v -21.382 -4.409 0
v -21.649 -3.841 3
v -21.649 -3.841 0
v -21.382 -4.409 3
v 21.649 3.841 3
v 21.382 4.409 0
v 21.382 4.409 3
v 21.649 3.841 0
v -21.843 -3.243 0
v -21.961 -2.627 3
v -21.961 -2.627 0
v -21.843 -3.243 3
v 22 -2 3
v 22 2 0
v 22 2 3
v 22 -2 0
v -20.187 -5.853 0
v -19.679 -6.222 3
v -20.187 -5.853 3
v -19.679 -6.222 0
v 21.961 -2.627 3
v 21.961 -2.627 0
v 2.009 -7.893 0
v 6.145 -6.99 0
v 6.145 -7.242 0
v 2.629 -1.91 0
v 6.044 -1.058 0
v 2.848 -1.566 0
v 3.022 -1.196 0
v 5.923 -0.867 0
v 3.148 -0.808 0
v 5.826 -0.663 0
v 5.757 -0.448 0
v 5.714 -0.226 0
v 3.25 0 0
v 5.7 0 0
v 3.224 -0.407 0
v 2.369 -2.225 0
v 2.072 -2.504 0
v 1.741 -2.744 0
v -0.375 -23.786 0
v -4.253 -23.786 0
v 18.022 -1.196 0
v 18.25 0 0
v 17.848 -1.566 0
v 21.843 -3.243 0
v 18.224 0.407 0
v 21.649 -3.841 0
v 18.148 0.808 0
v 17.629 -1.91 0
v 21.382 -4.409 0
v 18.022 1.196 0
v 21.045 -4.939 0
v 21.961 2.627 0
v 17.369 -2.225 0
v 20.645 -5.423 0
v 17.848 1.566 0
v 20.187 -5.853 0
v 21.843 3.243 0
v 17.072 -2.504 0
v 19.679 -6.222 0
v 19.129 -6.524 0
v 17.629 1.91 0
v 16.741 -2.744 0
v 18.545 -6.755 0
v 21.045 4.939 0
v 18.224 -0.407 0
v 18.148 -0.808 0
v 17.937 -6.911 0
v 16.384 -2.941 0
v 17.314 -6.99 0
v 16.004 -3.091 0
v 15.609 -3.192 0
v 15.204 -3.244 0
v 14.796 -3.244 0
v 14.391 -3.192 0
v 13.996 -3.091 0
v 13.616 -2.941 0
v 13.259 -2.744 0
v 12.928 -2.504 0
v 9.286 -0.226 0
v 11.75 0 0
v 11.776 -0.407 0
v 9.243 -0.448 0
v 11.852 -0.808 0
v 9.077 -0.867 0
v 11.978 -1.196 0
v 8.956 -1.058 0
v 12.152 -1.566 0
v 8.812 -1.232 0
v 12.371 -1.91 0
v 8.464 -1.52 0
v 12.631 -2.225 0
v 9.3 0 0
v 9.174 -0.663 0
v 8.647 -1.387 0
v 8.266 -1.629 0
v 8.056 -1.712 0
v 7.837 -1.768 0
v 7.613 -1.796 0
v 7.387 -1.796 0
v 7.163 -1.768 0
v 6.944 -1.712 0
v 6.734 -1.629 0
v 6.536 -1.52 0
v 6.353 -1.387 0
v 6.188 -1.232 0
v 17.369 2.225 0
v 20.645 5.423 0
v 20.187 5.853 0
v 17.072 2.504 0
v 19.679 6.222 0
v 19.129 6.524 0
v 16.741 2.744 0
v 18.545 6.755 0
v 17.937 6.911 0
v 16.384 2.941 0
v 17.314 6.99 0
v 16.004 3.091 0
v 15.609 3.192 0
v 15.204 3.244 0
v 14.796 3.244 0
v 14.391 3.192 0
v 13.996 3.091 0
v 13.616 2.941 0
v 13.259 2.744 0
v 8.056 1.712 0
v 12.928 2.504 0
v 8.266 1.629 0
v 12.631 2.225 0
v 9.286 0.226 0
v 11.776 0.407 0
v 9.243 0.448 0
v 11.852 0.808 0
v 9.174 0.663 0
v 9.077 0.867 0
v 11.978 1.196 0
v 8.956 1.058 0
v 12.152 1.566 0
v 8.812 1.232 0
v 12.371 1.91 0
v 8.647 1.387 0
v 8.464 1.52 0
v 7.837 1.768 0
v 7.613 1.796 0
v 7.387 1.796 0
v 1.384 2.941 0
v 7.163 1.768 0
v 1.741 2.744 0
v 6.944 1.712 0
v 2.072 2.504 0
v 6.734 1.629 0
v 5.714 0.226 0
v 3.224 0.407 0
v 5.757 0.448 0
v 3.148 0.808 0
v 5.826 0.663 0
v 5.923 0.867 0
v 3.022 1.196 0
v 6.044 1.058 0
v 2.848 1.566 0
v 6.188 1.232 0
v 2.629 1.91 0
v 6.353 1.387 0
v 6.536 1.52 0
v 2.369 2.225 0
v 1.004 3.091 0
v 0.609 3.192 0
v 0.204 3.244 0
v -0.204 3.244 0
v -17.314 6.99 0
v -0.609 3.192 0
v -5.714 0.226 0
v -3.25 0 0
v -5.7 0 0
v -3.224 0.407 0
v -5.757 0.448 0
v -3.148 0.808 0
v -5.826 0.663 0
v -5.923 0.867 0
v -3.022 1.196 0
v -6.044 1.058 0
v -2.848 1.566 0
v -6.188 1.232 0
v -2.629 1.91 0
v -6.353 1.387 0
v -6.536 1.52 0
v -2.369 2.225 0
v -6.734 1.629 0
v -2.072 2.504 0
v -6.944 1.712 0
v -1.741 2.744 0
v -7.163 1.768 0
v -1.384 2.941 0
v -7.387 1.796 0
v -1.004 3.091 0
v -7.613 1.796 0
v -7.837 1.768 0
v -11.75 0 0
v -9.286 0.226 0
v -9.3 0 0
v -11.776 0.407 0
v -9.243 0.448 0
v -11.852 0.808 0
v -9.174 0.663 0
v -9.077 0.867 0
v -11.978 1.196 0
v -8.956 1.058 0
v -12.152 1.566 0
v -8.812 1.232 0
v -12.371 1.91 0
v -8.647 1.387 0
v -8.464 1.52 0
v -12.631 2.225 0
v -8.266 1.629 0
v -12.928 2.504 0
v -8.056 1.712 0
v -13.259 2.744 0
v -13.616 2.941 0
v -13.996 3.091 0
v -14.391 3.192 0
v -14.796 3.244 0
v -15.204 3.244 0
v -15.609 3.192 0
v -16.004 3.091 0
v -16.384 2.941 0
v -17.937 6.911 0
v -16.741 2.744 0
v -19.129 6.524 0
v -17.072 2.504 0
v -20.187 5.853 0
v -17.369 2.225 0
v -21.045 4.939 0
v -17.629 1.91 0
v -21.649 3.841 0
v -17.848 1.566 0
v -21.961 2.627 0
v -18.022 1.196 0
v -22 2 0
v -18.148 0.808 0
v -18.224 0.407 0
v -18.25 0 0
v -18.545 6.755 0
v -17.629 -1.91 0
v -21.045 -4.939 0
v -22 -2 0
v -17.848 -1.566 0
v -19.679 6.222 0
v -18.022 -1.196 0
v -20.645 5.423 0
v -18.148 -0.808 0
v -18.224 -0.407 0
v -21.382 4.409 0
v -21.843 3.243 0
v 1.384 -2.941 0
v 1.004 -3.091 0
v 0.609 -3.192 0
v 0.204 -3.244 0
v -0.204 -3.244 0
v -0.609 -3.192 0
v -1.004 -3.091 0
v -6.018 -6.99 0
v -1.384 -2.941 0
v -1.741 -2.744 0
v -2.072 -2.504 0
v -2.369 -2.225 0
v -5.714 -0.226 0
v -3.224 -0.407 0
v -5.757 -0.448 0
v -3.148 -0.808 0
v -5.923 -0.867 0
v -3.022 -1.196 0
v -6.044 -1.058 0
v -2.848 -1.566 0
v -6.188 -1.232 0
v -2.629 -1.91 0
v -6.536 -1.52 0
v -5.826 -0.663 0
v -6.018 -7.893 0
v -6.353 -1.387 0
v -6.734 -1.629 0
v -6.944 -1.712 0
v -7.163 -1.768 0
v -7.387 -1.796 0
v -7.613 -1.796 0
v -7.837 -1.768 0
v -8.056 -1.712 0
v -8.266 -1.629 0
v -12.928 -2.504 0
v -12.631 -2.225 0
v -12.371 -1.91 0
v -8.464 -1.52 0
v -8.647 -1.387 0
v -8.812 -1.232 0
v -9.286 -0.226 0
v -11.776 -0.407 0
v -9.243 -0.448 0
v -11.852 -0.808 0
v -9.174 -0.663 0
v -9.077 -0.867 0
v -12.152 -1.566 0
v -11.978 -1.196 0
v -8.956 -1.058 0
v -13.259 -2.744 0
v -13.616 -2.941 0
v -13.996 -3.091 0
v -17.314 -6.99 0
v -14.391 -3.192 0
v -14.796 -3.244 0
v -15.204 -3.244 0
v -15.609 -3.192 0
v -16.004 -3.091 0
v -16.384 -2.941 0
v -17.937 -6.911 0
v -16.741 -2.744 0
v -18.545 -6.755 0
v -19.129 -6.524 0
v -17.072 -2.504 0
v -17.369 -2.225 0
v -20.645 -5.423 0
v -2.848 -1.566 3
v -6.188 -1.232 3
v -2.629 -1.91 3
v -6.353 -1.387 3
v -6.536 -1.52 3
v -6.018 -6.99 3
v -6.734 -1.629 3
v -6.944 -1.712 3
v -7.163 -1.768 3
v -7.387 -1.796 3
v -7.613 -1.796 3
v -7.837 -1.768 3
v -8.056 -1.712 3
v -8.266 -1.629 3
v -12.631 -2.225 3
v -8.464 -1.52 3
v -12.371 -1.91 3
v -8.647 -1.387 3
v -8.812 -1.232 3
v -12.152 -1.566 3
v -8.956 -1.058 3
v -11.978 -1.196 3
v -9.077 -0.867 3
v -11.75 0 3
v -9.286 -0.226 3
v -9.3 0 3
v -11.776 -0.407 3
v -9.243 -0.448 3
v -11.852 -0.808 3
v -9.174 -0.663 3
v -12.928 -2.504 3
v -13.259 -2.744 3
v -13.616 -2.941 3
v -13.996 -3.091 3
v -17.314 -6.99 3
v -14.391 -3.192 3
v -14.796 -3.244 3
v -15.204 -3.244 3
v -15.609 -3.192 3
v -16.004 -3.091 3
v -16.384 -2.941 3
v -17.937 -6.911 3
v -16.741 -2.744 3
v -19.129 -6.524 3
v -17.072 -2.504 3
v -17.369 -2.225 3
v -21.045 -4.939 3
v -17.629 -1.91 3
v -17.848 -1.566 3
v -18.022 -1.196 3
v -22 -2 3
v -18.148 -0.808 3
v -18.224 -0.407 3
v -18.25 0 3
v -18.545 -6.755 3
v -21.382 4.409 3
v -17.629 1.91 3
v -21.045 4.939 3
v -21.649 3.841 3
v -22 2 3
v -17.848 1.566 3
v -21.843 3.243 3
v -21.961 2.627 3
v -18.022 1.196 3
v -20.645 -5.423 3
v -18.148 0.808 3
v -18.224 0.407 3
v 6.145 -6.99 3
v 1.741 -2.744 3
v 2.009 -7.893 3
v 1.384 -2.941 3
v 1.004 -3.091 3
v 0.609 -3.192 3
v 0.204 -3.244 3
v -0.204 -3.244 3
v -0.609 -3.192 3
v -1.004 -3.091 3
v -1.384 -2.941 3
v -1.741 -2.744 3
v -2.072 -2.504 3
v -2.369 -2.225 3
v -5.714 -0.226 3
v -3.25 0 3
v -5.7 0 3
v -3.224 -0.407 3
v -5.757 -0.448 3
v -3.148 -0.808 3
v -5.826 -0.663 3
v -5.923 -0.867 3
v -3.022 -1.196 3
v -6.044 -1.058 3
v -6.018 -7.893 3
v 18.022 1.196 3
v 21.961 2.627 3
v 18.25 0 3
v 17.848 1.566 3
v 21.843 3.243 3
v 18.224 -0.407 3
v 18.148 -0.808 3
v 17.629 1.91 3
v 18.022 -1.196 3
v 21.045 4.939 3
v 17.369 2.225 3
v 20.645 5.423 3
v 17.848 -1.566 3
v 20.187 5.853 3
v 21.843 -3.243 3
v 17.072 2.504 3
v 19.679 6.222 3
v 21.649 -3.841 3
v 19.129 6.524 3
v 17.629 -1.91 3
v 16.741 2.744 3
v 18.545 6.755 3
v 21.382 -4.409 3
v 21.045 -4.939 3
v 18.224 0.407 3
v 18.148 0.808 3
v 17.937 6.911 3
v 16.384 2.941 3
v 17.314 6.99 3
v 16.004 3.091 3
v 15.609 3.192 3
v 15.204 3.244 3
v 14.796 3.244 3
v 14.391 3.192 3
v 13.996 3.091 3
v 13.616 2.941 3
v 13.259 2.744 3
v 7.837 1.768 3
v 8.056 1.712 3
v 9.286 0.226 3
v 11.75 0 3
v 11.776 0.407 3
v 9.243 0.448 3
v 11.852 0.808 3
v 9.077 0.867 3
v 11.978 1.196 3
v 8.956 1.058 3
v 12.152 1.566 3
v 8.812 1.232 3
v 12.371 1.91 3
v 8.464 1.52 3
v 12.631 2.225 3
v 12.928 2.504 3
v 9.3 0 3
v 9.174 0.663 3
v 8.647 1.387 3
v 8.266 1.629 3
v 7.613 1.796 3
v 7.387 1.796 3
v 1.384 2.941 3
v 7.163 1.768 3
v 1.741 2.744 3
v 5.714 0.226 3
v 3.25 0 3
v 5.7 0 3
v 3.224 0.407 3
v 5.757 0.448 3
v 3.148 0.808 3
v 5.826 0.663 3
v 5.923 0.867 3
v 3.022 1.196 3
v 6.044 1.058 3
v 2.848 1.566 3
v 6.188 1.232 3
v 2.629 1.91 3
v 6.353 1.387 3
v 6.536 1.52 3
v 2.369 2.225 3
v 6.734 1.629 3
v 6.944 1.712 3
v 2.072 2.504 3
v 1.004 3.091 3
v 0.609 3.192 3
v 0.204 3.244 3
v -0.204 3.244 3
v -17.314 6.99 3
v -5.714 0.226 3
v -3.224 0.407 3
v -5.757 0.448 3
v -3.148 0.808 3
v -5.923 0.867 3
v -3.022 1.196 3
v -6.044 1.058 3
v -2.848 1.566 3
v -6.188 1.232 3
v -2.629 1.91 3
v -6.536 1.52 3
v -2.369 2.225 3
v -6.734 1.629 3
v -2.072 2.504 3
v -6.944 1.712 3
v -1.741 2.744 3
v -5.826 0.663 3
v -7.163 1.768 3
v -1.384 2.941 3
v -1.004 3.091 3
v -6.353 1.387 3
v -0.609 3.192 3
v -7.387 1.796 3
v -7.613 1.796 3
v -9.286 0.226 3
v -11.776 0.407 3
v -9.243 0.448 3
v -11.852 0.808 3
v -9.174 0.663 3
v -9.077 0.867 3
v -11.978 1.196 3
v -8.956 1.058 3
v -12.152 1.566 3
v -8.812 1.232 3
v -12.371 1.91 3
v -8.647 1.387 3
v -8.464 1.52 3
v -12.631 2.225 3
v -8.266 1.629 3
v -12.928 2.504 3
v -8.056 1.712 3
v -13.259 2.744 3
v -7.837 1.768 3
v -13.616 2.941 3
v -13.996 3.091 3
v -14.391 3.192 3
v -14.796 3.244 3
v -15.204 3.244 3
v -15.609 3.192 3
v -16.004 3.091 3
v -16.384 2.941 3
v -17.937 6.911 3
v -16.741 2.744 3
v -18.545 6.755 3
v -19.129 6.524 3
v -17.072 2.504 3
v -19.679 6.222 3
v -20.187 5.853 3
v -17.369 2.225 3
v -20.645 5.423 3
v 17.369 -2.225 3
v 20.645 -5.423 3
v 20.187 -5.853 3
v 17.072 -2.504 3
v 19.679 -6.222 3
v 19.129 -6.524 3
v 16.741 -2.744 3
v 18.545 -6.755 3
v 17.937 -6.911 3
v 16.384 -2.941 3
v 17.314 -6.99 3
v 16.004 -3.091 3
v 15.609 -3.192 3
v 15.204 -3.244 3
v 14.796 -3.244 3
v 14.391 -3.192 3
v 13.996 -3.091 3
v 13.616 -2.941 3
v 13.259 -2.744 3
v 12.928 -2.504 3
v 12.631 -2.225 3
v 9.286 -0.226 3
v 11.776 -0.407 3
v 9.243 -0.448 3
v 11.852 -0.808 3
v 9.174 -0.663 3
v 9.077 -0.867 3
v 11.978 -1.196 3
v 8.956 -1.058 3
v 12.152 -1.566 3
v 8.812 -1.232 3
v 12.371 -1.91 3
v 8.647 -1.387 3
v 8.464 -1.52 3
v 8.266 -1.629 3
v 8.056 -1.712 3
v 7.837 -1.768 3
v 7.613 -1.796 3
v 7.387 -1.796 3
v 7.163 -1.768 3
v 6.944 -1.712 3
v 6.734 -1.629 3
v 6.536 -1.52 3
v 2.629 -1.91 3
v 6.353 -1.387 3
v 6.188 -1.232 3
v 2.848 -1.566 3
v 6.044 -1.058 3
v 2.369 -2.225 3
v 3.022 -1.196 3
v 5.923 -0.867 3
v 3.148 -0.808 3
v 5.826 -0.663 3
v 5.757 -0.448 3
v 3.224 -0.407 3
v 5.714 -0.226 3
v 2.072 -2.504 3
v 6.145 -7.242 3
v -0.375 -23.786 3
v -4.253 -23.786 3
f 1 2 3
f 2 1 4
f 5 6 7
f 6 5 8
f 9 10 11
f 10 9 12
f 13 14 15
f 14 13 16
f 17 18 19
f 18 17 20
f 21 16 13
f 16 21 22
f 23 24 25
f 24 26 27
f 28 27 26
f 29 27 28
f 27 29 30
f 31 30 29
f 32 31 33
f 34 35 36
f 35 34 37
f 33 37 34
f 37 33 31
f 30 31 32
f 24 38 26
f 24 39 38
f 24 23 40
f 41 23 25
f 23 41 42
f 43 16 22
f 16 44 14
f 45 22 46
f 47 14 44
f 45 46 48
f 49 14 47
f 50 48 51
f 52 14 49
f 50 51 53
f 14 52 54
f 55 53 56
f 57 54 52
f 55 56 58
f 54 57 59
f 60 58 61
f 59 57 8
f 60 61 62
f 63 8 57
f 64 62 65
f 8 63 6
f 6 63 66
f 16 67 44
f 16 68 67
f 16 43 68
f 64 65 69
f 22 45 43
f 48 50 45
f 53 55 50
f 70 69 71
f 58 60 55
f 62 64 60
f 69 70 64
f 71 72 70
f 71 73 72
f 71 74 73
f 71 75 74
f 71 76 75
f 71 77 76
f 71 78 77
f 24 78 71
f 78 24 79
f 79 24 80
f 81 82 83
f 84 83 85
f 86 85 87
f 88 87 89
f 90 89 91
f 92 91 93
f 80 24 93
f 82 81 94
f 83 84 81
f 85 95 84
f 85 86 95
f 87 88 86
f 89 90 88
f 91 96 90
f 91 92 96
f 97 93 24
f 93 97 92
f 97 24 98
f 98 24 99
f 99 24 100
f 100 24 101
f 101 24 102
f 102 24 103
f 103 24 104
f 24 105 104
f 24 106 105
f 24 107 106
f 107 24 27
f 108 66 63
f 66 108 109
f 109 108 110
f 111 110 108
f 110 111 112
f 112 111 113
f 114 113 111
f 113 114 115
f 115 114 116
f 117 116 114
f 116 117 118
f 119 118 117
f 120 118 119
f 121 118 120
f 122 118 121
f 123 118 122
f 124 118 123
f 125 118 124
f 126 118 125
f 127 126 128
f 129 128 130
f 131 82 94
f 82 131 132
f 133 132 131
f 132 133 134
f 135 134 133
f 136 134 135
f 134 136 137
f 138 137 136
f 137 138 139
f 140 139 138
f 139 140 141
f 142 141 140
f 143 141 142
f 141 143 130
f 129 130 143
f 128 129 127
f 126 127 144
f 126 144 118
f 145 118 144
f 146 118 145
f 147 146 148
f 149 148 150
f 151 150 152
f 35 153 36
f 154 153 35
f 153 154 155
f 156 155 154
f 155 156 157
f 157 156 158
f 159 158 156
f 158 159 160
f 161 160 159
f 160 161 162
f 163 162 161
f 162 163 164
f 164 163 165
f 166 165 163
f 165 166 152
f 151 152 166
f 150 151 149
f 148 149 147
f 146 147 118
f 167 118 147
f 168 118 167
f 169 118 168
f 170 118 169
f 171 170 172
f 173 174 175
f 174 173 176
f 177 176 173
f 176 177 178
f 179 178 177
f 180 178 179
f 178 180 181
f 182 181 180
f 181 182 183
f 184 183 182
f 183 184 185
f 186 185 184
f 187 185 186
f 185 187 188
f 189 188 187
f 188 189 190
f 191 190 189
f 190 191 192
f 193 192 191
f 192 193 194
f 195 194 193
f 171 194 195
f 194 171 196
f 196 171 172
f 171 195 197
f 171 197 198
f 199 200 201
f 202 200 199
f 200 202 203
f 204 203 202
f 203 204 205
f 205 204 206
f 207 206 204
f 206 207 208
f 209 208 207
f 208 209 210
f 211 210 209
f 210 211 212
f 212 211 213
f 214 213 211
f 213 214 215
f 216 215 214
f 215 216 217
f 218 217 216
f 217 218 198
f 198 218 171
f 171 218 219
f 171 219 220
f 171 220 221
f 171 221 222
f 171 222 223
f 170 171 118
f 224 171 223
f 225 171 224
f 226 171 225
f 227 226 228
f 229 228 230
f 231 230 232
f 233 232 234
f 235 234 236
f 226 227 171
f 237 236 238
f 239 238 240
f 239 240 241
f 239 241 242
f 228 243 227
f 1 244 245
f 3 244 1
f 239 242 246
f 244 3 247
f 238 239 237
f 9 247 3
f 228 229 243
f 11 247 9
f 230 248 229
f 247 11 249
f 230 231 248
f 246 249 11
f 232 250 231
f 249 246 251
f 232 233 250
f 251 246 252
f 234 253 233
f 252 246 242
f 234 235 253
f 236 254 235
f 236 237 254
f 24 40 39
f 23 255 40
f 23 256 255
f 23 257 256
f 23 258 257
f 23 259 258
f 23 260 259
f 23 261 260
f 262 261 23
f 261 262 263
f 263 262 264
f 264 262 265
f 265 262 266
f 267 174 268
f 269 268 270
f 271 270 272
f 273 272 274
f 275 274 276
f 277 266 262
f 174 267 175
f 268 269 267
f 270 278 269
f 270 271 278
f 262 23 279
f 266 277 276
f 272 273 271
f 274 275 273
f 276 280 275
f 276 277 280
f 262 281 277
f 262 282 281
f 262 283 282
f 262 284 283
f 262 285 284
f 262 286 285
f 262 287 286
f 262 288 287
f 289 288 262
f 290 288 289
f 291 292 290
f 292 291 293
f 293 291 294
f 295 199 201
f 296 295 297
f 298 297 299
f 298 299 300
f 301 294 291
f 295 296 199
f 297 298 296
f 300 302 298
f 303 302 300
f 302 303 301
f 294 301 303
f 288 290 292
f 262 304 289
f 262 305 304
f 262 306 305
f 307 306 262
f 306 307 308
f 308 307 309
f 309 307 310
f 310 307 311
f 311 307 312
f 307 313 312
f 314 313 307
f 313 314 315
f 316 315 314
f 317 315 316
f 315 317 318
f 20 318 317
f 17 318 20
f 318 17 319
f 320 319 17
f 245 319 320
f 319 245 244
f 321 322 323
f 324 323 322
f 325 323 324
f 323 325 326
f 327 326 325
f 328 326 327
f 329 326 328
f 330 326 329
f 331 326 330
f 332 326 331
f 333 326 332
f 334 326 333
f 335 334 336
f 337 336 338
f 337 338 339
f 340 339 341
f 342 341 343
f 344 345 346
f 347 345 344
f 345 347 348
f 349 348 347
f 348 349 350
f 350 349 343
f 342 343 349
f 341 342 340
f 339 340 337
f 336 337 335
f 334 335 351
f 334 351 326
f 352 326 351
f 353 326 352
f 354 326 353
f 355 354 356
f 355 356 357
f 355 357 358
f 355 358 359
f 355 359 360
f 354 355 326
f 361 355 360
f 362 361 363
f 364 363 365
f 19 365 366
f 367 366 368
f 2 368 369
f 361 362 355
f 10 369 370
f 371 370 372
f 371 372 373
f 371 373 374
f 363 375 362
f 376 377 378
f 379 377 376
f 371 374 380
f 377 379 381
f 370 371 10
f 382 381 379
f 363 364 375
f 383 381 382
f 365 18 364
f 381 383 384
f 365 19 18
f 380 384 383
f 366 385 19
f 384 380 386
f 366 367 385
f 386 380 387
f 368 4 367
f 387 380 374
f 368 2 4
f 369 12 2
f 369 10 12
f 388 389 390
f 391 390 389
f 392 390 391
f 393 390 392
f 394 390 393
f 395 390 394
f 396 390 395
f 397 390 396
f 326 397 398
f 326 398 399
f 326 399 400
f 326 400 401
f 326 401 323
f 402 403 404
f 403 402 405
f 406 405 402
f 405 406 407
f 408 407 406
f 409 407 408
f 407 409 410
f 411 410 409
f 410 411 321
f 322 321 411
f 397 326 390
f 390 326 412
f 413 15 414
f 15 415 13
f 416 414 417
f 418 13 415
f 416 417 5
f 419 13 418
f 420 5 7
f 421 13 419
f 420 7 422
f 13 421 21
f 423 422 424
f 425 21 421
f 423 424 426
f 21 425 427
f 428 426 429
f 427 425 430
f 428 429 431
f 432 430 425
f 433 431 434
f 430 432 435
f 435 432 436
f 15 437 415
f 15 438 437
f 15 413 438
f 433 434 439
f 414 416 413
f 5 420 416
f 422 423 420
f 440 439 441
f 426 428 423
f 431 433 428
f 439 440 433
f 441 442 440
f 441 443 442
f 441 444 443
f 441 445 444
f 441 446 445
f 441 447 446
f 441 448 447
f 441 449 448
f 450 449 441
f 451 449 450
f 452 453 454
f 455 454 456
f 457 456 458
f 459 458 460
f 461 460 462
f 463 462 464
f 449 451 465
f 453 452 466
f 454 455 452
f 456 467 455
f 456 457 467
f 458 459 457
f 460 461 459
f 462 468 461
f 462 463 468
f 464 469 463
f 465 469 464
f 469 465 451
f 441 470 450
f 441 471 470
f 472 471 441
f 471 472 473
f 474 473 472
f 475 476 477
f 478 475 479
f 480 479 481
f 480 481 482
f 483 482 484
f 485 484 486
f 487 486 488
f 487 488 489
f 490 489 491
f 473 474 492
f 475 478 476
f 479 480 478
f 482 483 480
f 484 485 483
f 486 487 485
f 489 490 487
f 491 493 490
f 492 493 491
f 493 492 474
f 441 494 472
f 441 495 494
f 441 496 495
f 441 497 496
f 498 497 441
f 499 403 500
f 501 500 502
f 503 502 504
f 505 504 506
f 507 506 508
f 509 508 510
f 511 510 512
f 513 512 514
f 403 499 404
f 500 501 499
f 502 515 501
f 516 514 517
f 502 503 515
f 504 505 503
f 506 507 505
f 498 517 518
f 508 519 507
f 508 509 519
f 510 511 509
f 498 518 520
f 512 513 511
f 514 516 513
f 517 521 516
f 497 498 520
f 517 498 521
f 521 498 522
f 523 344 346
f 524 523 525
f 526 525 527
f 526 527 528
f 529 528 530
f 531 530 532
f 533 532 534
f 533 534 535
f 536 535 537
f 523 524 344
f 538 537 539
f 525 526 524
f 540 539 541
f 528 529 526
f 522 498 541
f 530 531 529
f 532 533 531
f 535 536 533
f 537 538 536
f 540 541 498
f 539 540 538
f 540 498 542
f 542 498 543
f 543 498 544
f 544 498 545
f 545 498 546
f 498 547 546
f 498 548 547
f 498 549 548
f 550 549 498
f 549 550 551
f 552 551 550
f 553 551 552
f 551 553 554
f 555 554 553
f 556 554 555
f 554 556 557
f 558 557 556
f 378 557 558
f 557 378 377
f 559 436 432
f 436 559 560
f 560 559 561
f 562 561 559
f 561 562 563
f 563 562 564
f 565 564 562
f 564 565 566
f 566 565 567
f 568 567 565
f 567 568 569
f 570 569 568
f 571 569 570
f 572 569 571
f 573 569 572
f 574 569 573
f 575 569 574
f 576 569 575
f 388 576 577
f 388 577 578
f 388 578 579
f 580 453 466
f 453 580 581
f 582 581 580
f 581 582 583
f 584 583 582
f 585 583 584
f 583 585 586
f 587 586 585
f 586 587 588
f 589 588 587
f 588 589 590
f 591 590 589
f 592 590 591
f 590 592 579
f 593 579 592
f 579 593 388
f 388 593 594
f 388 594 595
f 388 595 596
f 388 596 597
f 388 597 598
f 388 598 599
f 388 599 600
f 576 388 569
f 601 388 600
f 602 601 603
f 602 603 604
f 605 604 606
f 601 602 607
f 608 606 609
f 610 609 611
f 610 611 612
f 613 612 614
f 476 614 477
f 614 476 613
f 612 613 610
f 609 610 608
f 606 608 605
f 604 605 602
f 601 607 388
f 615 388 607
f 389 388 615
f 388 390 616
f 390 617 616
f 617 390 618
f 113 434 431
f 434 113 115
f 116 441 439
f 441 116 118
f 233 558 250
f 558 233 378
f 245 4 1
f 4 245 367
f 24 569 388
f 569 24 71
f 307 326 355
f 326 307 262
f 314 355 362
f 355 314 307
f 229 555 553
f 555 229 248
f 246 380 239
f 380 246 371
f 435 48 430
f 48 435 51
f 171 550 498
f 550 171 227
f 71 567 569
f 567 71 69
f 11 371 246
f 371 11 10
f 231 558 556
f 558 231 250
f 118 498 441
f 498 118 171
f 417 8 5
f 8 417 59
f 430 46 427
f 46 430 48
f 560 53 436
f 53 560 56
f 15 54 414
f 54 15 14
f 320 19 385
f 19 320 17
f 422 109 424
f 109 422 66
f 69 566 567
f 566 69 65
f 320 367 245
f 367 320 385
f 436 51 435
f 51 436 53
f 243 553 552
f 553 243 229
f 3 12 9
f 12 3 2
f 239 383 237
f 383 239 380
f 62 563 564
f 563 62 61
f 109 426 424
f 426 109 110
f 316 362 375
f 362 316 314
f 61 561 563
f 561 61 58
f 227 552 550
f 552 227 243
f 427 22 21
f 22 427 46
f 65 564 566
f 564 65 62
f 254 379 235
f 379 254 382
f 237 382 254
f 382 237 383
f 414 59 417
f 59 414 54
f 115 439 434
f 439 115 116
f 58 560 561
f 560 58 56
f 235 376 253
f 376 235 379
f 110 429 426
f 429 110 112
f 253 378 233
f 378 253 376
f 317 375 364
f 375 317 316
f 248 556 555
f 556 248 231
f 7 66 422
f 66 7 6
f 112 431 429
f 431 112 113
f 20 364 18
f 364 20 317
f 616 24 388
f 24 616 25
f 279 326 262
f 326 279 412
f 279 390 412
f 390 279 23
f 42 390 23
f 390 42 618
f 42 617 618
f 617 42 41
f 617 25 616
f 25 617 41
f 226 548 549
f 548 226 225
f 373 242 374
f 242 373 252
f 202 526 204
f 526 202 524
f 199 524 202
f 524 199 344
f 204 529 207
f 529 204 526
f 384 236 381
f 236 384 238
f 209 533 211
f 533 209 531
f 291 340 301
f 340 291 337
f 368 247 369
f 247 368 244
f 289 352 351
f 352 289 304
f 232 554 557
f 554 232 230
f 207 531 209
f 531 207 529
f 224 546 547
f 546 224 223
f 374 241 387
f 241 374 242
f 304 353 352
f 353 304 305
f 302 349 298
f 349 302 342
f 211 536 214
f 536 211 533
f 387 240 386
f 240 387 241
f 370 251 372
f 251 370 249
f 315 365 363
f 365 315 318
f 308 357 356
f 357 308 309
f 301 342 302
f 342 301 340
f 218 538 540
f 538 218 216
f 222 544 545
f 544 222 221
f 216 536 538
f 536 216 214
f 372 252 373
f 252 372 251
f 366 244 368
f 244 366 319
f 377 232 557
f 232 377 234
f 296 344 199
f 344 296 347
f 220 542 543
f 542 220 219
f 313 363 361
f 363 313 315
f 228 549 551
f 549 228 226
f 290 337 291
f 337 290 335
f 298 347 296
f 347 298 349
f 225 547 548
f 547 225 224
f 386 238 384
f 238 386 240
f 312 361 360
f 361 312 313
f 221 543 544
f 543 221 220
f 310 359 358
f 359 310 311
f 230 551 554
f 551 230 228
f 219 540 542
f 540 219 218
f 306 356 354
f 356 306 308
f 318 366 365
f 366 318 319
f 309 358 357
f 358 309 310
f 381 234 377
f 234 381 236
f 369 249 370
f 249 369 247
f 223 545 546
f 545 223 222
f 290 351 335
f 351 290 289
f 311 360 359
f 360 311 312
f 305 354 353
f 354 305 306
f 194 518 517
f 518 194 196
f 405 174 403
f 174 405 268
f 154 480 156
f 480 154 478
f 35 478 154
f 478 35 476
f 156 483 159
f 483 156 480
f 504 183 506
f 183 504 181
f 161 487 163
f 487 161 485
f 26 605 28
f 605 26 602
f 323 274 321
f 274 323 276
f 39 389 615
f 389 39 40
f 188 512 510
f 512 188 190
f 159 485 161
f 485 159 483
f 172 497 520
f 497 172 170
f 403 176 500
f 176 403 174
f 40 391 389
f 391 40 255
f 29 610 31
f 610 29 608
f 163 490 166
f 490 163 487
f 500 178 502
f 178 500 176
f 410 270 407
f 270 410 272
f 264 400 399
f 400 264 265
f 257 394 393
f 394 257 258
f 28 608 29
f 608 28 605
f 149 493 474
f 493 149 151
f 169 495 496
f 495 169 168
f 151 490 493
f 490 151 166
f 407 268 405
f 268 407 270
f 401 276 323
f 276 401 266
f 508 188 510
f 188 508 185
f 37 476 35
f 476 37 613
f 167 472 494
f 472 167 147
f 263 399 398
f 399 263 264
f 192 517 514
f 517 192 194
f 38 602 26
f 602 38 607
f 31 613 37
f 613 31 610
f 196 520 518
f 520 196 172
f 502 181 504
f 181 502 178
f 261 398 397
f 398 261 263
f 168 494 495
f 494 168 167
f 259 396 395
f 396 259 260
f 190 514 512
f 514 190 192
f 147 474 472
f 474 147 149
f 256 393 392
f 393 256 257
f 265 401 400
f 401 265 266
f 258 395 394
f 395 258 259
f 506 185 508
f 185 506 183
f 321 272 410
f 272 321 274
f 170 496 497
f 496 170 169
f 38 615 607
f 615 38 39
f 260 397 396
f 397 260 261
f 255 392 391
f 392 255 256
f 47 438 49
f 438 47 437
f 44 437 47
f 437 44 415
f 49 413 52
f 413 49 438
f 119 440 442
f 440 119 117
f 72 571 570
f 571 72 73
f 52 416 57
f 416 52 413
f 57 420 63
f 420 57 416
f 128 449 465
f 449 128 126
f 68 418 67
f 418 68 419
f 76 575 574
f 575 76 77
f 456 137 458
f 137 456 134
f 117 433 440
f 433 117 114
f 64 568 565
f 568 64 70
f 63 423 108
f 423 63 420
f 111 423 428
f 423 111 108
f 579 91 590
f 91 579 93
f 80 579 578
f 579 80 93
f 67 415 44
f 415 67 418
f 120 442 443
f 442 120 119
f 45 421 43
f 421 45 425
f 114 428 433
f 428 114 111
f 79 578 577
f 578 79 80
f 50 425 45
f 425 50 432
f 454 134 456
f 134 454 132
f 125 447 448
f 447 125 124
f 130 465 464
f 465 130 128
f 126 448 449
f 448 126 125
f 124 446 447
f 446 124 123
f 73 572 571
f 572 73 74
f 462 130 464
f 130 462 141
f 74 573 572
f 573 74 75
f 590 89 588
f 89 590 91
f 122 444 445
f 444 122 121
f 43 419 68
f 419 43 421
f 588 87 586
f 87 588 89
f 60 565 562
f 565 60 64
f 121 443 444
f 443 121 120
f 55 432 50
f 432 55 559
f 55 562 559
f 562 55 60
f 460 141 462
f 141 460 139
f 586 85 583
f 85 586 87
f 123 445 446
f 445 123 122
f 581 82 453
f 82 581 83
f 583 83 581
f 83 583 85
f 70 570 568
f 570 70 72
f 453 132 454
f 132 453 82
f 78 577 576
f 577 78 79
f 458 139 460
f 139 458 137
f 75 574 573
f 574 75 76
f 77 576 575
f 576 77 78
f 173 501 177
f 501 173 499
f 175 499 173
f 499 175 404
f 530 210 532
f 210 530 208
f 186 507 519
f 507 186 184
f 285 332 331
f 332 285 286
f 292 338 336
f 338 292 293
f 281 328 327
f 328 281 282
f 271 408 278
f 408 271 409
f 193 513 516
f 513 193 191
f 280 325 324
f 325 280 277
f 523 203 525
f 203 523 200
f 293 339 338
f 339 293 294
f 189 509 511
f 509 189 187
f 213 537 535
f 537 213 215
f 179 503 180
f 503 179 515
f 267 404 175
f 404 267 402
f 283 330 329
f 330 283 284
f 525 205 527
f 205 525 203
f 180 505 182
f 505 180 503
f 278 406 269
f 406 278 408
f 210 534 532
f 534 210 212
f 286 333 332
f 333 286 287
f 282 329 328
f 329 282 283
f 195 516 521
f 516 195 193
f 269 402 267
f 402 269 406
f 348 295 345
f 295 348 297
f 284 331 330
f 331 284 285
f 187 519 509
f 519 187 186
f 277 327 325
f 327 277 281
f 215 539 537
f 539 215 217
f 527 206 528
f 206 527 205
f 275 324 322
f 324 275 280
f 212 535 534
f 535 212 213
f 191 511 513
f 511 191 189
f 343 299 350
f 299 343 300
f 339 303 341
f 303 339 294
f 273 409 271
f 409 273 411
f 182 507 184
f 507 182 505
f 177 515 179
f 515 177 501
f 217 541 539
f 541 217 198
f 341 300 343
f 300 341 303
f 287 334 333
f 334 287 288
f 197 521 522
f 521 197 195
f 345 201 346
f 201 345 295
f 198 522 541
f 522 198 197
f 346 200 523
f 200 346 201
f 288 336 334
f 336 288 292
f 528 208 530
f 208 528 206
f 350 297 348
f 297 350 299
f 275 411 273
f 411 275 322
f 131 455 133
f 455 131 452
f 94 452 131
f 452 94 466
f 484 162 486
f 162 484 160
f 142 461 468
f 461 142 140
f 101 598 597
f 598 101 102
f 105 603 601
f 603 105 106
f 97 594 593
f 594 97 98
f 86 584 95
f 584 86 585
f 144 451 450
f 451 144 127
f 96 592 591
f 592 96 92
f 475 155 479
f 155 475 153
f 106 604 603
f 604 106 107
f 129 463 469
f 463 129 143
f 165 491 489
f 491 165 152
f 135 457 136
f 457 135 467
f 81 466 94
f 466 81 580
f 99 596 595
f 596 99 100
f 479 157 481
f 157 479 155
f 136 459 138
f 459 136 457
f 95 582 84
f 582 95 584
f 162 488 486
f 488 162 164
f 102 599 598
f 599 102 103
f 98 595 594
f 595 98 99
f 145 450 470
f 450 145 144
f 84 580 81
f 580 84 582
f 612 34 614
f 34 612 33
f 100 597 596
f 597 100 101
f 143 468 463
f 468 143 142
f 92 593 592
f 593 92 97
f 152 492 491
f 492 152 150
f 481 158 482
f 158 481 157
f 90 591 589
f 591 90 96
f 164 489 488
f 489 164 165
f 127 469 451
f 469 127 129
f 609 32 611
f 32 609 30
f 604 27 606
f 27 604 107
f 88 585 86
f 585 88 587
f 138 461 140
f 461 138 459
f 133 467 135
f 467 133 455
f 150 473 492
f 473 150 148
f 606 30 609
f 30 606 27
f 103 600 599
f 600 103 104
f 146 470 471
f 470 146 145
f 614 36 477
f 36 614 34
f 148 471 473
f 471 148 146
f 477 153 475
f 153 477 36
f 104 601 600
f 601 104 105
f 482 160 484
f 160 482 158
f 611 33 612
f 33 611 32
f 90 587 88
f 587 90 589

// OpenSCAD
$fn = 50;


difference() {
	union() {
		hull() {
			translate(v = [-17.0000000000, 2.0000000000, 0]) {
				cylinder(h = 3, r = 5);
			}
			translate(v = [17.0000000000, 2.0000000000, 0]) {
				cylinder(h = 3, r = 5);
			}
			translate(v = [-17.0000000000, -2.0000000000, 0]) {
				cylinder(h = 3, r = 5);
			}
			translate(v = [17.0000000000, -2.0000000000, 0]) {
				cylinder(h = 3, r = 5);
			}
		}
		translate(v = [0, -5, 0]) {
			linear_extrude(height = 3) {
				text(font = "DejaVu Sans Mono:style=Bold", halign = "center", size = 19.0000000000, text = "7", valign = "top");
			}
		}
	}
	union() {
		translate(v = [-15.0000000000, 0.0000000000, 0]) {
			translate(v = [0, 0, -100]) {
				cylinder(h = 200, r = 3.2500000000);
			}
		}
		translate(v = [0, 0, -100]) {
			cylinder(h = 200, r = 3.2500000000);
		}
		translate(v = [15.0000000000, 0.0000000000, 0]) {
			translate(v = [0, 0, -100]) {
				cylinder(h = 200, r = 3.2500000000);
			}
		}
		translate(v = [-15.0000000000, 0.0000000000, 0]) {
			translate(v = [0, 0, -100]) {
				cylinder(h = 200, r = 1.8000000000);
			}
		}
		translate(v = [-7.5000000000, 0.0000000000, 0]) {
			translate(v = [0, 0, -100]) {
				cylinder(h = 200, r = 1.8000000000);
			}
		}
		translate(v = [0, 0, -100]) {
			cylinder(h = 200, r = 1.8000000000);
		}
		translate(v = [7.5000000000, 0.0000000000, 0]) {
			translate(v = [0, 0, -100]) {
				cylinder(h = 200, r = 1.8000000000);
			}
		}
		translate(v = [15.0000000000, 0.0000000000, 0]) {
			translate(v = [0, 0, -100]) {
				cylinder(h = 200, r = 1.8000000000);
			}
		}
	}
}
